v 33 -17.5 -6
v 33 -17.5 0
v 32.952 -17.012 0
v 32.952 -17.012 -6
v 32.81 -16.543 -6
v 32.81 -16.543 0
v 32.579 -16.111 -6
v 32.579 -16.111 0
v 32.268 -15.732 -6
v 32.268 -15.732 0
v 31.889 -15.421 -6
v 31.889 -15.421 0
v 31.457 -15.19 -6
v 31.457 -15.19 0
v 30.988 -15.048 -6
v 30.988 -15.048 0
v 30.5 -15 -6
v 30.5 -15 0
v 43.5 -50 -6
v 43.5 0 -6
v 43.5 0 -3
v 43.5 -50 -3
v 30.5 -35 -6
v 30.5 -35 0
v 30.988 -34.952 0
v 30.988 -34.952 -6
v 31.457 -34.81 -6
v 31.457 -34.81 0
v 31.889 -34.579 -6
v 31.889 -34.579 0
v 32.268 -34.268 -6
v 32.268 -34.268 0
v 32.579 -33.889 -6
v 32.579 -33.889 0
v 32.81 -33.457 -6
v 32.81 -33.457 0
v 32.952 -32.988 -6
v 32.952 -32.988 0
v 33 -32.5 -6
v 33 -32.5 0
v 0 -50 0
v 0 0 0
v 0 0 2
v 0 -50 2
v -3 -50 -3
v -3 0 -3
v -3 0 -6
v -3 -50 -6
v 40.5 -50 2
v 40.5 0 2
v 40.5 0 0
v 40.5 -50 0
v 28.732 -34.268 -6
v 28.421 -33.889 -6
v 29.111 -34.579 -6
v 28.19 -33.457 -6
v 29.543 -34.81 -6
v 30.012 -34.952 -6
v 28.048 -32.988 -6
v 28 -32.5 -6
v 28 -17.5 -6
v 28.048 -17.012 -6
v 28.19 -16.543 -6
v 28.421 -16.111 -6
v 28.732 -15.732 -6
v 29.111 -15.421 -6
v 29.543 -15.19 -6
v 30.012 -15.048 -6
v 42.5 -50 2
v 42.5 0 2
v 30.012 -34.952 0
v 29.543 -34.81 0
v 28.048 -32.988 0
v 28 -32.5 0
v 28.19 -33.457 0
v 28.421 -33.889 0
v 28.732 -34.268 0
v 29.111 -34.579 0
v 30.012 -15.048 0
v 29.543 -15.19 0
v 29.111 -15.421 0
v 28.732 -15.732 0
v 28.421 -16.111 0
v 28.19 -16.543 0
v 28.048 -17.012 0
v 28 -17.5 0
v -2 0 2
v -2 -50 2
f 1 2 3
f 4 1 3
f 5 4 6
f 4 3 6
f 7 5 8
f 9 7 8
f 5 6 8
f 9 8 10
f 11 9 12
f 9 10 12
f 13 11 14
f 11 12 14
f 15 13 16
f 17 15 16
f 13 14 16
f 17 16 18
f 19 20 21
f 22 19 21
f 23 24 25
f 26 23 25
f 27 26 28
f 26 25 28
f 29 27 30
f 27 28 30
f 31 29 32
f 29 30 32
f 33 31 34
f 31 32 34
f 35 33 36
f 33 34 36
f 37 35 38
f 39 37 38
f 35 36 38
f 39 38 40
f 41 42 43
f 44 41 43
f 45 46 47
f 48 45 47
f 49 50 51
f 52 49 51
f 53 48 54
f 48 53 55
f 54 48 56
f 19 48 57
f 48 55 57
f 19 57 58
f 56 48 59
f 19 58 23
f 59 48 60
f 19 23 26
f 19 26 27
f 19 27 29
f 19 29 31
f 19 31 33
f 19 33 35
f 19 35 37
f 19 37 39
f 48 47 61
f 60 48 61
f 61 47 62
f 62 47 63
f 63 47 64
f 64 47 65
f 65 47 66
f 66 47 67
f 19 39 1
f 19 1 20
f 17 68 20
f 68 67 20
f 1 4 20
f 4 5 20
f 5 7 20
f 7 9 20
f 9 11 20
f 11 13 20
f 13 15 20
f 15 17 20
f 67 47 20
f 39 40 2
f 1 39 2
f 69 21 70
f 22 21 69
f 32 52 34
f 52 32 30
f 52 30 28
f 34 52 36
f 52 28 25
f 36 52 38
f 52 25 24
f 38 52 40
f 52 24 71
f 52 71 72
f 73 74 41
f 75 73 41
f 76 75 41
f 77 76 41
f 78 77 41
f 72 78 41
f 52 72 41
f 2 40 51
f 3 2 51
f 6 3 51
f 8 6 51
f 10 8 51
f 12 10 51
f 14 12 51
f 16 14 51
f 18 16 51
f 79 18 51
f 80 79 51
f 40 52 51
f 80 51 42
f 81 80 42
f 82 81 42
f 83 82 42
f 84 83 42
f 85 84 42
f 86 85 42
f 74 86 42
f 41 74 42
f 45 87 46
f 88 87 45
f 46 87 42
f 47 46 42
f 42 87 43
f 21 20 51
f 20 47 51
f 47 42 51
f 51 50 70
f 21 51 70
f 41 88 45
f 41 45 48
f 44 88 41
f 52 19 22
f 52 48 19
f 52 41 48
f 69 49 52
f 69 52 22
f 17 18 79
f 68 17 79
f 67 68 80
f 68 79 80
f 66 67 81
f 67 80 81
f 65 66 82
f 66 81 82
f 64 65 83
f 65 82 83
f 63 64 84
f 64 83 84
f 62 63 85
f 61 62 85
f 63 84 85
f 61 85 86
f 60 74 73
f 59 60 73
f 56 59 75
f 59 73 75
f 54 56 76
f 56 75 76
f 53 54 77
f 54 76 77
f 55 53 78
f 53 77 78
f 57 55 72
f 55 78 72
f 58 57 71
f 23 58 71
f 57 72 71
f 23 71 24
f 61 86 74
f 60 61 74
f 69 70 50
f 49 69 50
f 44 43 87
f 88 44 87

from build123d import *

# Parameters (mm, degrees)
F1_DEPTH = 50
F2_SIZE2 = 1
F2_SIZE  = 5
F3_SIZE2 = 5
F3_SIZE  = 1
F5_DEPTH = 25


with BuildPart() as f1:
    # F0 (on Front) → F1 (new body)
    with BuildSketch(Plane.XZ):
        Polygon((40.5, 0), (0, 0), (0, 2), (-3, 2), (-3, -6), (0, -6), (40.5, -6), (43.5, -6), (43.5, 2), (40.5, 2), align=None)
    extrude(amount=F1_DEPTH)

    # F2
    f2_edges = [f1.edges().sort_by_distance(p)[0] for p in [
        (-3, -25, 2),
    ]]
    f2_side = f1.faces().sort_by_distance((-3, -25, -2))[0]
    chamfer(f2_edges, length=F2_SIZE, length2=F2_SIZE2, reference=f2_side)

    # F3
    f3_edges = [f1.edges().sort_by_distance(p)[0] for p in [
        (43.5, -25, 2),
    ]]
    f3_side = f1.faces().sort_by_distance((42, -25, 2))[0]
    chamfer(f3_edges, length=F3_SIZE, length2=F3_SIZE2, reference=f3_side)

    # F4 (on face) → F5 (cut)
    with BuildSketch(Plane.XY):
        with BuildLine():
            ThreePointArc((30.5, -35), (32.267766953, -34.267766953), (33, -32.5))
            Line((33, -32.5), (33, -17.5))
            ThreePointArc((33, -17.5), (32.267766953, -15.732233047), (30.5, -15))
            ThreePointArc((30.5, -15), (28.732233047, -15.732233047), (28, -17.5))
            Line((28, -17.5), (28, -32.5))
            ThreePointArc((28, -32.5), (28.732233047, -34.267766953), (30.5, -35))
        make_face()
    extrude(amount=-F5_DEPTH, mode=Mode.SUBTRACT)


solid = f1.part
